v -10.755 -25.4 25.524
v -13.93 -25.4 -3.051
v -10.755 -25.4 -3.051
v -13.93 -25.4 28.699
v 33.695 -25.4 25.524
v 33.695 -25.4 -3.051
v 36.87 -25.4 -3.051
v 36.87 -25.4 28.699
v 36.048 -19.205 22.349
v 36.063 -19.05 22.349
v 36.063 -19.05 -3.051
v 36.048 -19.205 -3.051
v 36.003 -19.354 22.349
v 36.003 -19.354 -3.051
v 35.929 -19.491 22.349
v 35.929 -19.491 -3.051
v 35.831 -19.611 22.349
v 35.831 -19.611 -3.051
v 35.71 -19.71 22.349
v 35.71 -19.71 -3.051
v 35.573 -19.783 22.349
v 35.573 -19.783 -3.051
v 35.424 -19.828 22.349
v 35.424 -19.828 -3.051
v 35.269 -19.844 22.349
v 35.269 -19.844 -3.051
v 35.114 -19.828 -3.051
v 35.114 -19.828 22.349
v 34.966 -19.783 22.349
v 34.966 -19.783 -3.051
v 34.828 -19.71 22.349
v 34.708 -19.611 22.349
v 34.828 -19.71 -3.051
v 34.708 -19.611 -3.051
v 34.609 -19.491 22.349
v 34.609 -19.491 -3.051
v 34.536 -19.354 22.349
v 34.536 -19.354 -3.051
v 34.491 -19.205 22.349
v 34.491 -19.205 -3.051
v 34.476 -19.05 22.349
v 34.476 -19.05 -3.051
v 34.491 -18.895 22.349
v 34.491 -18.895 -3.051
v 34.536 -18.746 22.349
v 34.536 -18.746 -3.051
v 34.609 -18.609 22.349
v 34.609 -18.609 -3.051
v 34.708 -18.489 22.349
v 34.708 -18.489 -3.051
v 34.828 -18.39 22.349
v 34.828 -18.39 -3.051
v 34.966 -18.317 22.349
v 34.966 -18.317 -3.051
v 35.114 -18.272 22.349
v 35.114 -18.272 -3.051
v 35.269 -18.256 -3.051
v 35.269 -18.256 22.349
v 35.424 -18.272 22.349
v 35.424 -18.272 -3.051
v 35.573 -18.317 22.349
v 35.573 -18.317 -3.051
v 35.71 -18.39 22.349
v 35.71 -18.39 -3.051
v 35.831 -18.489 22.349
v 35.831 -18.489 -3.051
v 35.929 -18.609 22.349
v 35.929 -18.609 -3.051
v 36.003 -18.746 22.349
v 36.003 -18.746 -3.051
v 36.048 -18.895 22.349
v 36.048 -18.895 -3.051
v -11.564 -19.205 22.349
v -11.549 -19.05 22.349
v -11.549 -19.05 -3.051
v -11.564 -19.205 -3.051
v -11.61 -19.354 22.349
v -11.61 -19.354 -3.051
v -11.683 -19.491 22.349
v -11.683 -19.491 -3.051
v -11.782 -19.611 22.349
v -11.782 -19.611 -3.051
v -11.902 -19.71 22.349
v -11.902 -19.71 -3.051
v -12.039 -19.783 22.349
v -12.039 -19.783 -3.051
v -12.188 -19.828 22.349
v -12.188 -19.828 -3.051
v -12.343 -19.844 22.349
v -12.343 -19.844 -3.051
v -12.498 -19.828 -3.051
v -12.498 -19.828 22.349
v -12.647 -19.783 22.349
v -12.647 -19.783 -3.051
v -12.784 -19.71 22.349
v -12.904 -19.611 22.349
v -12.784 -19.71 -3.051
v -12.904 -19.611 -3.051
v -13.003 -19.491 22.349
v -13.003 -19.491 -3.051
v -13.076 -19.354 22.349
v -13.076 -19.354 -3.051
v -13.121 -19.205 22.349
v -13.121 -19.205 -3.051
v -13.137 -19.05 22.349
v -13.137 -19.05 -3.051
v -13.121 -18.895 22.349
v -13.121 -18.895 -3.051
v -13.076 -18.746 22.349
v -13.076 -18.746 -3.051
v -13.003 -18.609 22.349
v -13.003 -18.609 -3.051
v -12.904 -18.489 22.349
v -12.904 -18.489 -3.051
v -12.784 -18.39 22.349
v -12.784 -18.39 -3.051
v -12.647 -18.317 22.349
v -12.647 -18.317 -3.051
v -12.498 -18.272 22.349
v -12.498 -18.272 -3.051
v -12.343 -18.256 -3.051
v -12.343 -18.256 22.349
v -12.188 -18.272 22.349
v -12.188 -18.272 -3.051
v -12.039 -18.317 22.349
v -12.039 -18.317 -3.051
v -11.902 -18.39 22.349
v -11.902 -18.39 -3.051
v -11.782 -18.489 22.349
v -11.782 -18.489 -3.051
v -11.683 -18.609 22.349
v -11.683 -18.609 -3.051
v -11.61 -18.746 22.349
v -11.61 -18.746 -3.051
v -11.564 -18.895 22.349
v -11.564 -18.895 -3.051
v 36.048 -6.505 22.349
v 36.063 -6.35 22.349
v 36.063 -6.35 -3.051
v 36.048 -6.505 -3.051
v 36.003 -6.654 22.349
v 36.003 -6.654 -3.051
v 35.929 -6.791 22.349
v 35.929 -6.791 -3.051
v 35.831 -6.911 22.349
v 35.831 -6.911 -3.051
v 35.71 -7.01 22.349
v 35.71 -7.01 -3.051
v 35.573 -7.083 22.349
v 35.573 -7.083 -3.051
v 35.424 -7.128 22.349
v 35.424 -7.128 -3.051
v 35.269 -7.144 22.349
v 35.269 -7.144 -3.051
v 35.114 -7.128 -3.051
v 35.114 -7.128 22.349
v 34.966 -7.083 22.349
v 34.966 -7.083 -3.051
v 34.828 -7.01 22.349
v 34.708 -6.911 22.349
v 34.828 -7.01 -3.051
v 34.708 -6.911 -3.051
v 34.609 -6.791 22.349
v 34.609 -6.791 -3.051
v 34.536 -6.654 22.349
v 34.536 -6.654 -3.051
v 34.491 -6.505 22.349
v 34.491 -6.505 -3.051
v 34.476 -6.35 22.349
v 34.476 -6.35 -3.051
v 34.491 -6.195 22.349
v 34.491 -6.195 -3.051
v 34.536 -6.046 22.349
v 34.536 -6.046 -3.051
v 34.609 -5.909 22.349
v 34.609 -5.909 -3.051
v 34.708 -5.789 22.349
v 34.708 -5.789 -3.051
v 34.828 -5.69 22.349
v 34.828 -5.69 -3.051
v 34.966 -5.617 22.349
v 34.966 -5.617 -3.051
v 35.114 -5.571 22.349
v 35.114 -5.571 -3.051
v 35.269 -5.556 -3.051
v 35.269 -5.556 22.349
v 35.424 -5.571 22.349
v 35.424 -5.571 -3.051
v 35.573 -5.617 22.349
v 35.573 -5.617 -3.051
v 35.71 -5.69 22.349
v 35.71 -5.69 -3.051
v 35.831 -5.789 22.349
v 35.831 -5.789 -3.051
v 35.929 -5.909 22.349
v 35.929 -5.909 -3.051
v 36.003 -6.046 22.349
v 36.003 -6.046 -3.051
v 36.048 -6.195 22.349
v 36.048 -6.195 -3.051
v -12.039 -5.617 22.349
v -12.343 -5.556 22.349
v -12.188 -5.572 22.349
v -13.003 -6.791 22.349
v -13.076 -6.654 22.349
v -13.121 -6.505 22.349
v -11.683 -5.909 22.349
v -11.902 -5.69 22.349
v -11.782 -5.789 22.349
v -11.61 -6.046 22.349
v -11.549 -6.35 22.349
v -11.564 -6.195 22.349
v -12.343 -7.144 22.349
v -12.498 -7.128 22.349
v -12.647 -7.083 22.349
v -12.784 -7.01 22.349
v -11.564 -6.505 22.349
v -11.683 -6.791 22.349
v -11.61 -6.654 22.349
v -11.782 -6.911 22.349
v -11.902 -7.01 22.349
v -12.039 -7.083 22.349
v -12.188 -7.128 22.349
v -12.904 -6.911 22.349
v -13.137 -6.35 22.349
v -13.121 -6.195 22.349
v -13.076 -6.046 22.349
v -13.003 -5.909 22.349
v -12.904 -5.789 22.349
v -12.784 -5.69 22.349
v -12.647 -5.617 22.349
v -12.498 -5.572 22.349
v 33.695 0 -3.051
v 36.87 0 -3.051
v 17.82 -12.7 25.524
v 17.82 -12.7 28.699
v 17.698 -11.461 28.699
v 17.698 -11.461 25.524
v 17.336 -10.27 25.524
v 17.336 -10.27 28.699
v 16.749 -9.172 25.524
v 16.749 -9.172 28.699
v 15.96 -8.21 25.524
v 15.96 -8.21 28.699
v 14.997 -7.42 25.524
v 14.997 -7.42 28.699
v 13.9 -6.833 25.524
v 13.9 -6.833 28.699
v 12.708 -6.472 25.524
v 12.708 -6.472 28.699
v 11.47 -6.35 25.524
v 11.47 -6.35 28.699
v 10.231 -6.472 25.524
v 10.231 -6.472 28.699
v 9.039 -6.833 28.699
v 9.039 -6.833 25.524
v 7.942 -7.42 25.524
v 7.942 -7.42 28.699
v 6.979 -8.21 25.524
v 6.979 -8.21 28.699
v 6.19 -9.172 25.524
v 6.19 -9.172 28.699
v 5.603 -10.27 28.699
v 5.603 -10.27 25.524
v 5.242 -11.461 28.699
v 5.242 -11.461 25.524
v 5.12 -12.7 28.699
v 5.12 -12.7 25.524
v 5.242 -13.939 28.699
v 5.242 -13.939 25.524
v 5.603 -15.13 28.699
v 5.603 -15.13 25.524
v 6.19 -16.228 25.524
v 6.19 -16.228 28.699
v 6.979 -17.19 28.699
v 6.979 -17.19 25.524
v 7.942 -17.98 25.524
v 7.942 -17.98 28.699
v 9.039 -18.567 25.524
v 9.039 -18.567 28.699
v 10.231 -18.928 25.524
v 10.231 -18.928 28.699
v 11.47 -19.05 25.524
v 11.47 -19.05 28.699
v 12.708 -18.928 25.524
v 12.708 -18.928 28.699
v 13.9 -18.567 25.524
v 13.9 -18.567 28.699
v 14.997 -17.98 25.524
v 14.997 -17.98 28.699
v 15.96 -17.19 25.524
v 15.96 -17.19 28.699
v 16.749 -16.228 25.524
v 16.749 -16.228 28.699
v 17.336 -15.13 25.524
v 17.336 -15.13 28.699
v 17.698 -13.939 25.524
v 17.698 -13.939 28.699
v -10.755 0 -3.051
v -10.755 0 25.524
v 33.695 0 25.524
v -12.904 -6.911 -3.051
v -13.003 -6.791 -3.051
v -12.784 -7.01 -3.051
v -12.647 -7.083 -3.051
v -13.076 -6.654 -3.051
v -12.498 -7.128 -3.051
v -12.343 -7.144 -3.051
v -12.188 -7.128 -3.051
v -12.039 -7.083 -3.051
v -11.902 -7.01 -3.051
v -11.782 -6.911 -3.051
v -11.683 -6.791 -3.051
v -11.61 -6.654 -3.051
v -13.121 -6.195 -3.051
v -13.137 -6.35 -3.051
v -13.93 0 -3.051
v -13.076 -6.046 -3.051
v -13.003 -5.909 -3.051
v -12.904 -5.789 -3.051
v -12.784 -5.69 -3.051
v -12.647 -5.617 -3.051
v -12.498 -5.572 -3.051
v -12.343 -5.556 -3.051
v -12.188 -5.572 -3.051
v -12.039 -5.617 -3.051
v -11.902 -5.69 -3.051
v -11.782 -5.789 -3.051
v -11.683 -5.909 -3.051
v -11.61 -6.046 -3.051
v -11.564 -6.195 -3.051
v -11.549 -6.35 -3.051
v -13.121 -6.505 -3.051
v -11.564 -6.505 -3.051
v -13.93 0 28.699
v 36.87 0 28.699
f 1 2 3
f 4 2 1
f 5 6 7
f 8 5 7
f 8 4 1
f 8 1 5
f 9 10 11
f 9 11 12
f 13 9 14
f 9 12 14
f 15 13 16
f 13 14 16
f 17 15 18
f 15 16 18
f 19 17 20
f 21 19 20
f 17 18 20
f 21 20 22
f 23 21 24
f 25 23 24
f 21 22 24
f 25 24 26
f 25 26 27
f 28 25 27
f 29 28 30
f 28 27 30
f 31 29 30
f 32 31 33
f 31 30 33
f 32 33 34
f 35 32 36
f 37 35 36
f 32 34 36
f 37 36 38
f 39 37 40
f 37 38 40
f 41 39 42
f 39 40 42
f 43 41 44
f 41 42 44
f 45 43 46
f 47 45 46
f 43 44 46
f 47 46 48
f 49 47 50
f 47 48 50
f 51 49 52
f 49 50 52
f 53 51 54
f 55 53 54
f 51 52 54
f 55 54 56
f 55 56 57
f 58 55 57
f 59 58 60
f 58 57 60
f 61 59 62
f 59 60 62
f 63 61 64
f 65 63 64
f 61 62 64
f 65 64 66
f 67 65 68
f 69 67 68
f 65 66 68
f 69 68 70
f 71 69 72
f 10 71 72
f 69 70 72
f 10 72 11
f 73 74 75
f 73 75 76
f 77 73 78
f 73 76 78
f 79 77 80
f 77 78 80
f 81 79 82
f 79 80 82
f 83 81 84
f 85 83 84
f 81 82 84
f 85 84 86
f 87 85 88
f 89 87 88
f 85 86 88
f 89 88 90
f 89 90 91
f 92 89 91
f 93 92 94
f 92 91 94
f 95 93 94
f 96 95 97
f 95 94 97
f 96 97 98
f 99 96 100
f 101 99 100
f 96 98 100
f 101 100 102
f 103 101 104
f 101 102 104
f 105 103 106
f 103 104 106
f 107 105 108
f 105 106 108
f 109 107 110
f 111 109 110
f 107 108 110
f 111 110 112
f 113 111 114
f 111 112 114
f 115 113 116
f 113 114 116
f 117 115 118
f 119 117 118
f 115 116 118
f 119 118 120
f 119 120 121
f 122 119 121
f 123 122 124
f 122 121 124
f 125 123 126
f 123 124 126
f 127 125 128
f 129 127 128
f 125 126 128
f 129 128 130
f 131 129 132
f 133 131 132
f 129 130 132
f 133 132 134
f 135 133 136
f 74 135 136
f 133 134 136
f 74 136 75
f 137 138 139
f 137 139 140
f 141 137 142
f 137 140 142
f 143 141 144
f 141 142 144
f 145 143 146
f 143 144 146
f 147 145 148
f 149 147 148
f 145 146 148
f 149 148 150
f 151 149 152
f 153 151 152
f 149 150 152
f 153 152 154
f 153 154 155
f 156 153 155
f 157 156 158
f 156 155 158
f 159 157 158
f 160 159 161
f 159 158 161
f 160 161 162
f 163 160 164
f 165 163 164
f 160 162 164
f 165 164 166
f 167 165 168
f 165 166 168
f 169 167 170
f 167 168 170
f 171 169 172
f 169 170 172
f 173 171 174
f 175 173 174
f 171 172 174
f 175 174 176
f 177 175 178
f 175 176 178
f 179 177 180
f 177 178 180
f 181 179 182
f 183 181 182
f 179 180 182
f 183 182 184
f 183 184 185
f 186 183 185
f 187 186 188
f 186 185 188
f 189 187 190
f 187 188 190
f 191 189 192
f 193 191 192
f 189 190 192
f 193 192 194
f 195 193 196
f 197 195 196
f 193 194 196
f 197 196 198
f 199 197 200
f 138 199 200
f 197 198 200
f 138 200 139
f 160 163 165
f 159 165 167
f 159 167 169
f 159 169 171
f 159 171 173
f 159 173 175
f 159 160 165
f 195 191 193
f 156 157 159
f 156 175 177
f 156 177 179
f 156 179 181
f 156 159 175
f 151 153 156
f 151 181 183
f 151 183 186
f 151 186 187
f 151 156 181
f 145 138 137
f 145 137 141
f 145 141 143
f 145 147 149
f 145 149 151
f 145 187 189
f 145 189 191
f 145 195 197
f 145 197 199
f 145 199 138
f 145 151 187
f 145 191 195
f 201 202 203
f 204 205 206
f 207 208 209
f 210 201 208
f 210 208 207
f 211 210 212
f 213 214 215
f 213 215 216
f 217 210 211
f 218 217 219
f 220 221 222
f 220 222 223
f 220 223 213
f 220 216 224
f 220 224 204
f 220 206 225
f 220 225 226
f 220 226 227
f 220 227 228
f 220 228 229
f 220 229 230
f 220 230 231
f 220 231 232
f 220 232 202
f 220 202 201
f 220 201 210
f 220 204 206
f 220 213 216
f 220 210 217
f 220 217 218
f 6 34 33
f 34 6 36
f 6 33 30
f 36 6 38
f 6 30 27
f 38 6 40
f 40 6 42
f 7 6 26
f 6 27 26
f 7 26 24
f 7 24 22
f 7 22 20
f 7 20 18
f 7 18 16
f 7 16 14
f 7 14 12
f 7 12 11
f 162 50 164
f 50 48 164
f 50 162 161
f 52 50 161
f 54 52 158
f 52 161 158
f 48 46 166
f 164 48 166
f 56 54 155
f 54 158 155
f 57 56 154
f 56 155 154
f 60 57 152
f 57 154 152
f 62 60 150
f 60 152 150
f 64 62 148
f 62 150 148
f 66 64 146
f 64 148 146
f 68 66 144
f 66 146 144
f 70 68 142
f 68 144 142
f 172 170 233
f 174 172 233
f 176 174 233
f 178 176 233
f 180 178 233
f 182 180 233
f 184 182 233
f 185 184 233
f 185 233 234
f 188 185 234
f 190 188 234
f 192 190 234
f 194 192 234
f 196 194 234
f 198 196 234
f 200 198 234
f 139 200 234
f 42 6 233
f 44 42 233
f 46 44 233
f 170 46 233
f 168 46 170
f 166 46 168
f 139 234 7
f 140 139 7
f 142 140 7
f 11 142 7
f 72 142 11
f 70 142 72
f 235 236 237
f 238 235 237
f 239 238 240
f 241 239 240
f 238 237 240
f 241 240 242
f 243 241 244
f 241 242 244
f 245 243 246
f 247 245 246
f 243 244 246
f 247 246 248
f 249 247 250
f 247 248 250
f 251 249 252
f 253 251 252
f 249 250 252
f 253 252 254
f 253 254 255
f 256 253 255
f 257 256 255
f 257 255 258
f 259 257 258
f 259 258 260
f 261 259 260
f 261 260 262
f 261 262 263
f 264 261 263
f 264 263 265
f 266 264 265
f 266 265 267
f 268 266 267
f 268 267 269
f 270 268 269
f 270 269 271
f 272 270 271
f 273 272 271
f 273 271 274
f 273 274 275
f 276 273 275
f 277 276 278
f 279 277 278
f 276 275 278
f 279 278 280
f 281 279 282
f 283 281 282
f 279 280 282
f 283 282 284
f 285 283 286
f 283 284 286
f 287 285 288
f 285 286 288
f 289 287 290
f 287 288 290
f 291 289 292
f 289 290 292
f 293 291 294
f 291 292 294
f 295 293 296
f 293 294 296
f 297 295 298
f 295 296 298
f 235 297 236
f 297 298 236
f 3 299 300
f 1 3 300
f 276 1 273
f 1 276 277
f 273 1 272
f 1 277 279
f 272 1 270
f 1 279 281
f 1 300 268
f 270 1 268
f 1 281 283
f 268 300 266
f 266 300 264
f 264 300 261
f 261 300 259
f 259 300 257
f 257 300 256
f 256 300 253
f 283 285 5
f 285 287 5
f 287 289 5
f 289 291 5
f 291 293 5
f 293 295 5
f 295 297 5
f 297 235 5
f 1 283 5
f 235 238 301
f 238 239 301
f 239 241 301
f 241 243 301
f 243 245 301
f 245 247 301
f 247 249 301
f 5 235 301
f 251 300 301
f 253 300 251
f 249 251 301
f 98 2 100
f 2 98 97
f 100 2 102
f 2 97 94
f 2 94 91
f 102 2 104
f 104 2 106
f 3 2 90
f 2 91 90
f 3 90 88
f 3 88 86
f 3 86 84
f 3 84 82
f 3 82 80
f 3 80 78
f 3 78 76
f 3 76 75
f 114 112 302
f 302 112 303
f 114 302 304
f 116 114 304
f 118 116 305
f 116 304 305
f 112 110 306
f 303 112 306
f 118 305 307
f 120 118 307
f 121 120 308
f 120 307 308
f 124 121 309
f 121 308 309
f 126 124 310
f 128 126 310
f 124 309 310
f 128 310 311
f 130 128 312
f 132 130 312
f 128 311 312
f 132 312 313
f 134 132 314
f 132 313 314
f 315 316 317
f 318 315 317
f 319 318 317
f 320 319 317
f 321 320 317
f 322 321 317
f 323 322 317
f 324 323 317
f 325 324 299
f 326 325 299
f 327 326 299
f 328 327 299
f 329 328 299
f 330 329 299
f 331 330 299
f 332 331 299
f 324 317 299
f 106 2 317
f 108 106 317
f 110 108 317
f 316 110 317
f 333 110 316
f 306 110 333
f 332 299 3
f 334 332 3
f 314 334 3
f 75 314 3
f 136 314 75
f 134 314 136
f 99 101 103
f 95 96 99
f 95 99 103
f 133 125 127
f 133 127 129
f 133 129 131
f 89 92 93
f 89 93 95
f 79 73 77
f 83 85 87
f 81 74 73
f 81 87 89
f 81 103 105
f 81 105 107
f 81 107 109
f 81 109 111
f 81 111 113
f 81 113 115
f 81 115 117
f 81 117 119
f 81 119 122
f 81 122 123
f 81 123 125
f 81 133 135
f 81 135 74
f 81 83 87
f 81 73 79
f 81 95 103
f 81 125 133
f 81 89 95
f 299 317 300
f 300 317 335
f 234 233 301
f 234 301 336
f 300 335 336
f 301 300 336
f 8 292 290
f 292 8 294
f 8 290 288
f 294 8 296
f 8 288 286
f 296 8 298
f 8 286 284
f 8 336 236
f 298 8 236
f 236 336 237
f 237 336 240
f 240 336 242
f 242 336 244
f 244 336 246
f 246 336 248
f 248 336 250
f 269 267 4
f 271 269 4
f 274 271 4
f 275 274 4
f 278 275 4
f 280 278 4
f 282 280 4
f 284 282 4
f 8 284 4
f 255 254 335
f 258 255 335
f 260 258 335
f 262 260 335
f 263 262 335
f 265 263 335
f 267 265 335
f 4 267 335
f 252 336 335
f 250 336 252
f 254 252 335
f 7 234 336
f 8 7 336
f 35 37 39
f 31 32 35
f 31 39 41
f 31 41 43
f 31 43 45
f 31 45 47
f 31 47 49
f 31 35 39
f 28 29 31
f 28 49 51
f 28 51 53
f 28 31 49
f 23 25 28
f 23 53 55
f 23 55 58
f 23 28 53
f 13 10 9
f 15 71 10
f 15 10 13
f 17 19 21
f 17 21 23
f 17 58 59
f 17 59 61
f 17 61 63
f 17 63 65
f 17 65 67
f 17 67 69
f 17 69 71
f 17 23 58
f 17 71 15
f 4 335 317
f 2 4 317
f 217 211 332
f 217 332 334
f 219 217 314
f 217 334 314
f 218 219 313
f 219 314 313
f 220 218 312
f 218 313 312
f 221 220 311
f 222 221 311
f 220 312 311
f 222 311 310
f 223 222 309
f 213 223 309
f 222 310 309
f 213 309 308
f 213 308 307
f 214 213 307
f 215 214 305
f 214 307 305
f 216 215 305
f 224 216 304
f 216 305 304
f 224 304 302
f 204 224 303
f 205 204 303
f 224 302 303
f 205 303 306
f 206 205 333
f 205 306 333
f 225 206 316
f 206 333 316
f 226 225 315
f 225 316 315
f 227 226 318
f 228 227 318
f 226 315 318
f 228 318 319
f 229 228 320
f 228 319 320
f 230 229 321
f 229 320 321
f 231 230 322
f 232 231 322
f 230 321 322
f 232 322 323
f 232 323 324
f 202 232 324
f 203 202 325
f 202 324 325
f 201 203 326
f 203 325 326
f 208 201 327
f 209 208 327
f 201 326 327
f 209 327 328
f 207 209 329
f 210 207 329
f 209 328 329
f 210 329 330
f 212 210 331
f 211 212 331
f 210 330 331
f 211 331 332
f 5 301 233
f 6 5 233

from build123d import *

# Parameters (mm, degrees)
F1_DEPTH = 25.4
F2_R     = 6.35
F3_DEPTH = 25.4
F4_R     = 0.79375
F6_DEPTH = 25.4
F5_R     = 0.79375
F7_DEPTH = 25.4


with BuildPart() as f1:
    # F0 (on Front) → F1 (new body)
    with BuildSketch(Plane.XZ):
        Polygon((-13.930467, 28.698625), (-13.930467, -3.051375), (-10.755467, -3.051375), (-10.755467, 25.523625), (33.694533, 25.523625), (33.694533, -3.051375), (36.869533, -3.051375), (36.869533, 28.698625), align=None)
    extrude(amount=F1_DEPTH)

    # F2 (on face) → F3 (cut)
    with BuildSketch(Plane.XY.offset(28.698625)):
        with Locations((11.469533, -12.7)):
            Circle(F2_R)
    extrude(amount=-F3_DEPTH, mode=Mode.SUBTRACT)

    # F4 (on face) → F6 (cut)
    with BuildSketch(Plane(origin=(0, 0, -3.051375), x_dir=(1, 0, 0), z_dir=(0, 0, -1))):
        with Locations((-12.342967, 19.05)):
            Circle(F4_R)
        with Locations((-12.342967, 6.35)):
            Circle(F4_R)
    extrude(amount=-F6_DEPTH, mode=Mode.SUBTRACT)

    # F5 (on face) → F7 (cut)
    with BuildSketch(Plane(origin=(0, 0, -3.051375), x_dir=(1, 0, 0), z_dir=(0, 0, -1))):
        with Locations((35.269333, 19.05)):
            Circle(F5_R)
        with Locations((35.269333, 6.349987)):
            Circle(F5_R)
    extrude(amount=-F7_DEPTH, mode=Mode.SUBTRACT)


solid = f1.part
